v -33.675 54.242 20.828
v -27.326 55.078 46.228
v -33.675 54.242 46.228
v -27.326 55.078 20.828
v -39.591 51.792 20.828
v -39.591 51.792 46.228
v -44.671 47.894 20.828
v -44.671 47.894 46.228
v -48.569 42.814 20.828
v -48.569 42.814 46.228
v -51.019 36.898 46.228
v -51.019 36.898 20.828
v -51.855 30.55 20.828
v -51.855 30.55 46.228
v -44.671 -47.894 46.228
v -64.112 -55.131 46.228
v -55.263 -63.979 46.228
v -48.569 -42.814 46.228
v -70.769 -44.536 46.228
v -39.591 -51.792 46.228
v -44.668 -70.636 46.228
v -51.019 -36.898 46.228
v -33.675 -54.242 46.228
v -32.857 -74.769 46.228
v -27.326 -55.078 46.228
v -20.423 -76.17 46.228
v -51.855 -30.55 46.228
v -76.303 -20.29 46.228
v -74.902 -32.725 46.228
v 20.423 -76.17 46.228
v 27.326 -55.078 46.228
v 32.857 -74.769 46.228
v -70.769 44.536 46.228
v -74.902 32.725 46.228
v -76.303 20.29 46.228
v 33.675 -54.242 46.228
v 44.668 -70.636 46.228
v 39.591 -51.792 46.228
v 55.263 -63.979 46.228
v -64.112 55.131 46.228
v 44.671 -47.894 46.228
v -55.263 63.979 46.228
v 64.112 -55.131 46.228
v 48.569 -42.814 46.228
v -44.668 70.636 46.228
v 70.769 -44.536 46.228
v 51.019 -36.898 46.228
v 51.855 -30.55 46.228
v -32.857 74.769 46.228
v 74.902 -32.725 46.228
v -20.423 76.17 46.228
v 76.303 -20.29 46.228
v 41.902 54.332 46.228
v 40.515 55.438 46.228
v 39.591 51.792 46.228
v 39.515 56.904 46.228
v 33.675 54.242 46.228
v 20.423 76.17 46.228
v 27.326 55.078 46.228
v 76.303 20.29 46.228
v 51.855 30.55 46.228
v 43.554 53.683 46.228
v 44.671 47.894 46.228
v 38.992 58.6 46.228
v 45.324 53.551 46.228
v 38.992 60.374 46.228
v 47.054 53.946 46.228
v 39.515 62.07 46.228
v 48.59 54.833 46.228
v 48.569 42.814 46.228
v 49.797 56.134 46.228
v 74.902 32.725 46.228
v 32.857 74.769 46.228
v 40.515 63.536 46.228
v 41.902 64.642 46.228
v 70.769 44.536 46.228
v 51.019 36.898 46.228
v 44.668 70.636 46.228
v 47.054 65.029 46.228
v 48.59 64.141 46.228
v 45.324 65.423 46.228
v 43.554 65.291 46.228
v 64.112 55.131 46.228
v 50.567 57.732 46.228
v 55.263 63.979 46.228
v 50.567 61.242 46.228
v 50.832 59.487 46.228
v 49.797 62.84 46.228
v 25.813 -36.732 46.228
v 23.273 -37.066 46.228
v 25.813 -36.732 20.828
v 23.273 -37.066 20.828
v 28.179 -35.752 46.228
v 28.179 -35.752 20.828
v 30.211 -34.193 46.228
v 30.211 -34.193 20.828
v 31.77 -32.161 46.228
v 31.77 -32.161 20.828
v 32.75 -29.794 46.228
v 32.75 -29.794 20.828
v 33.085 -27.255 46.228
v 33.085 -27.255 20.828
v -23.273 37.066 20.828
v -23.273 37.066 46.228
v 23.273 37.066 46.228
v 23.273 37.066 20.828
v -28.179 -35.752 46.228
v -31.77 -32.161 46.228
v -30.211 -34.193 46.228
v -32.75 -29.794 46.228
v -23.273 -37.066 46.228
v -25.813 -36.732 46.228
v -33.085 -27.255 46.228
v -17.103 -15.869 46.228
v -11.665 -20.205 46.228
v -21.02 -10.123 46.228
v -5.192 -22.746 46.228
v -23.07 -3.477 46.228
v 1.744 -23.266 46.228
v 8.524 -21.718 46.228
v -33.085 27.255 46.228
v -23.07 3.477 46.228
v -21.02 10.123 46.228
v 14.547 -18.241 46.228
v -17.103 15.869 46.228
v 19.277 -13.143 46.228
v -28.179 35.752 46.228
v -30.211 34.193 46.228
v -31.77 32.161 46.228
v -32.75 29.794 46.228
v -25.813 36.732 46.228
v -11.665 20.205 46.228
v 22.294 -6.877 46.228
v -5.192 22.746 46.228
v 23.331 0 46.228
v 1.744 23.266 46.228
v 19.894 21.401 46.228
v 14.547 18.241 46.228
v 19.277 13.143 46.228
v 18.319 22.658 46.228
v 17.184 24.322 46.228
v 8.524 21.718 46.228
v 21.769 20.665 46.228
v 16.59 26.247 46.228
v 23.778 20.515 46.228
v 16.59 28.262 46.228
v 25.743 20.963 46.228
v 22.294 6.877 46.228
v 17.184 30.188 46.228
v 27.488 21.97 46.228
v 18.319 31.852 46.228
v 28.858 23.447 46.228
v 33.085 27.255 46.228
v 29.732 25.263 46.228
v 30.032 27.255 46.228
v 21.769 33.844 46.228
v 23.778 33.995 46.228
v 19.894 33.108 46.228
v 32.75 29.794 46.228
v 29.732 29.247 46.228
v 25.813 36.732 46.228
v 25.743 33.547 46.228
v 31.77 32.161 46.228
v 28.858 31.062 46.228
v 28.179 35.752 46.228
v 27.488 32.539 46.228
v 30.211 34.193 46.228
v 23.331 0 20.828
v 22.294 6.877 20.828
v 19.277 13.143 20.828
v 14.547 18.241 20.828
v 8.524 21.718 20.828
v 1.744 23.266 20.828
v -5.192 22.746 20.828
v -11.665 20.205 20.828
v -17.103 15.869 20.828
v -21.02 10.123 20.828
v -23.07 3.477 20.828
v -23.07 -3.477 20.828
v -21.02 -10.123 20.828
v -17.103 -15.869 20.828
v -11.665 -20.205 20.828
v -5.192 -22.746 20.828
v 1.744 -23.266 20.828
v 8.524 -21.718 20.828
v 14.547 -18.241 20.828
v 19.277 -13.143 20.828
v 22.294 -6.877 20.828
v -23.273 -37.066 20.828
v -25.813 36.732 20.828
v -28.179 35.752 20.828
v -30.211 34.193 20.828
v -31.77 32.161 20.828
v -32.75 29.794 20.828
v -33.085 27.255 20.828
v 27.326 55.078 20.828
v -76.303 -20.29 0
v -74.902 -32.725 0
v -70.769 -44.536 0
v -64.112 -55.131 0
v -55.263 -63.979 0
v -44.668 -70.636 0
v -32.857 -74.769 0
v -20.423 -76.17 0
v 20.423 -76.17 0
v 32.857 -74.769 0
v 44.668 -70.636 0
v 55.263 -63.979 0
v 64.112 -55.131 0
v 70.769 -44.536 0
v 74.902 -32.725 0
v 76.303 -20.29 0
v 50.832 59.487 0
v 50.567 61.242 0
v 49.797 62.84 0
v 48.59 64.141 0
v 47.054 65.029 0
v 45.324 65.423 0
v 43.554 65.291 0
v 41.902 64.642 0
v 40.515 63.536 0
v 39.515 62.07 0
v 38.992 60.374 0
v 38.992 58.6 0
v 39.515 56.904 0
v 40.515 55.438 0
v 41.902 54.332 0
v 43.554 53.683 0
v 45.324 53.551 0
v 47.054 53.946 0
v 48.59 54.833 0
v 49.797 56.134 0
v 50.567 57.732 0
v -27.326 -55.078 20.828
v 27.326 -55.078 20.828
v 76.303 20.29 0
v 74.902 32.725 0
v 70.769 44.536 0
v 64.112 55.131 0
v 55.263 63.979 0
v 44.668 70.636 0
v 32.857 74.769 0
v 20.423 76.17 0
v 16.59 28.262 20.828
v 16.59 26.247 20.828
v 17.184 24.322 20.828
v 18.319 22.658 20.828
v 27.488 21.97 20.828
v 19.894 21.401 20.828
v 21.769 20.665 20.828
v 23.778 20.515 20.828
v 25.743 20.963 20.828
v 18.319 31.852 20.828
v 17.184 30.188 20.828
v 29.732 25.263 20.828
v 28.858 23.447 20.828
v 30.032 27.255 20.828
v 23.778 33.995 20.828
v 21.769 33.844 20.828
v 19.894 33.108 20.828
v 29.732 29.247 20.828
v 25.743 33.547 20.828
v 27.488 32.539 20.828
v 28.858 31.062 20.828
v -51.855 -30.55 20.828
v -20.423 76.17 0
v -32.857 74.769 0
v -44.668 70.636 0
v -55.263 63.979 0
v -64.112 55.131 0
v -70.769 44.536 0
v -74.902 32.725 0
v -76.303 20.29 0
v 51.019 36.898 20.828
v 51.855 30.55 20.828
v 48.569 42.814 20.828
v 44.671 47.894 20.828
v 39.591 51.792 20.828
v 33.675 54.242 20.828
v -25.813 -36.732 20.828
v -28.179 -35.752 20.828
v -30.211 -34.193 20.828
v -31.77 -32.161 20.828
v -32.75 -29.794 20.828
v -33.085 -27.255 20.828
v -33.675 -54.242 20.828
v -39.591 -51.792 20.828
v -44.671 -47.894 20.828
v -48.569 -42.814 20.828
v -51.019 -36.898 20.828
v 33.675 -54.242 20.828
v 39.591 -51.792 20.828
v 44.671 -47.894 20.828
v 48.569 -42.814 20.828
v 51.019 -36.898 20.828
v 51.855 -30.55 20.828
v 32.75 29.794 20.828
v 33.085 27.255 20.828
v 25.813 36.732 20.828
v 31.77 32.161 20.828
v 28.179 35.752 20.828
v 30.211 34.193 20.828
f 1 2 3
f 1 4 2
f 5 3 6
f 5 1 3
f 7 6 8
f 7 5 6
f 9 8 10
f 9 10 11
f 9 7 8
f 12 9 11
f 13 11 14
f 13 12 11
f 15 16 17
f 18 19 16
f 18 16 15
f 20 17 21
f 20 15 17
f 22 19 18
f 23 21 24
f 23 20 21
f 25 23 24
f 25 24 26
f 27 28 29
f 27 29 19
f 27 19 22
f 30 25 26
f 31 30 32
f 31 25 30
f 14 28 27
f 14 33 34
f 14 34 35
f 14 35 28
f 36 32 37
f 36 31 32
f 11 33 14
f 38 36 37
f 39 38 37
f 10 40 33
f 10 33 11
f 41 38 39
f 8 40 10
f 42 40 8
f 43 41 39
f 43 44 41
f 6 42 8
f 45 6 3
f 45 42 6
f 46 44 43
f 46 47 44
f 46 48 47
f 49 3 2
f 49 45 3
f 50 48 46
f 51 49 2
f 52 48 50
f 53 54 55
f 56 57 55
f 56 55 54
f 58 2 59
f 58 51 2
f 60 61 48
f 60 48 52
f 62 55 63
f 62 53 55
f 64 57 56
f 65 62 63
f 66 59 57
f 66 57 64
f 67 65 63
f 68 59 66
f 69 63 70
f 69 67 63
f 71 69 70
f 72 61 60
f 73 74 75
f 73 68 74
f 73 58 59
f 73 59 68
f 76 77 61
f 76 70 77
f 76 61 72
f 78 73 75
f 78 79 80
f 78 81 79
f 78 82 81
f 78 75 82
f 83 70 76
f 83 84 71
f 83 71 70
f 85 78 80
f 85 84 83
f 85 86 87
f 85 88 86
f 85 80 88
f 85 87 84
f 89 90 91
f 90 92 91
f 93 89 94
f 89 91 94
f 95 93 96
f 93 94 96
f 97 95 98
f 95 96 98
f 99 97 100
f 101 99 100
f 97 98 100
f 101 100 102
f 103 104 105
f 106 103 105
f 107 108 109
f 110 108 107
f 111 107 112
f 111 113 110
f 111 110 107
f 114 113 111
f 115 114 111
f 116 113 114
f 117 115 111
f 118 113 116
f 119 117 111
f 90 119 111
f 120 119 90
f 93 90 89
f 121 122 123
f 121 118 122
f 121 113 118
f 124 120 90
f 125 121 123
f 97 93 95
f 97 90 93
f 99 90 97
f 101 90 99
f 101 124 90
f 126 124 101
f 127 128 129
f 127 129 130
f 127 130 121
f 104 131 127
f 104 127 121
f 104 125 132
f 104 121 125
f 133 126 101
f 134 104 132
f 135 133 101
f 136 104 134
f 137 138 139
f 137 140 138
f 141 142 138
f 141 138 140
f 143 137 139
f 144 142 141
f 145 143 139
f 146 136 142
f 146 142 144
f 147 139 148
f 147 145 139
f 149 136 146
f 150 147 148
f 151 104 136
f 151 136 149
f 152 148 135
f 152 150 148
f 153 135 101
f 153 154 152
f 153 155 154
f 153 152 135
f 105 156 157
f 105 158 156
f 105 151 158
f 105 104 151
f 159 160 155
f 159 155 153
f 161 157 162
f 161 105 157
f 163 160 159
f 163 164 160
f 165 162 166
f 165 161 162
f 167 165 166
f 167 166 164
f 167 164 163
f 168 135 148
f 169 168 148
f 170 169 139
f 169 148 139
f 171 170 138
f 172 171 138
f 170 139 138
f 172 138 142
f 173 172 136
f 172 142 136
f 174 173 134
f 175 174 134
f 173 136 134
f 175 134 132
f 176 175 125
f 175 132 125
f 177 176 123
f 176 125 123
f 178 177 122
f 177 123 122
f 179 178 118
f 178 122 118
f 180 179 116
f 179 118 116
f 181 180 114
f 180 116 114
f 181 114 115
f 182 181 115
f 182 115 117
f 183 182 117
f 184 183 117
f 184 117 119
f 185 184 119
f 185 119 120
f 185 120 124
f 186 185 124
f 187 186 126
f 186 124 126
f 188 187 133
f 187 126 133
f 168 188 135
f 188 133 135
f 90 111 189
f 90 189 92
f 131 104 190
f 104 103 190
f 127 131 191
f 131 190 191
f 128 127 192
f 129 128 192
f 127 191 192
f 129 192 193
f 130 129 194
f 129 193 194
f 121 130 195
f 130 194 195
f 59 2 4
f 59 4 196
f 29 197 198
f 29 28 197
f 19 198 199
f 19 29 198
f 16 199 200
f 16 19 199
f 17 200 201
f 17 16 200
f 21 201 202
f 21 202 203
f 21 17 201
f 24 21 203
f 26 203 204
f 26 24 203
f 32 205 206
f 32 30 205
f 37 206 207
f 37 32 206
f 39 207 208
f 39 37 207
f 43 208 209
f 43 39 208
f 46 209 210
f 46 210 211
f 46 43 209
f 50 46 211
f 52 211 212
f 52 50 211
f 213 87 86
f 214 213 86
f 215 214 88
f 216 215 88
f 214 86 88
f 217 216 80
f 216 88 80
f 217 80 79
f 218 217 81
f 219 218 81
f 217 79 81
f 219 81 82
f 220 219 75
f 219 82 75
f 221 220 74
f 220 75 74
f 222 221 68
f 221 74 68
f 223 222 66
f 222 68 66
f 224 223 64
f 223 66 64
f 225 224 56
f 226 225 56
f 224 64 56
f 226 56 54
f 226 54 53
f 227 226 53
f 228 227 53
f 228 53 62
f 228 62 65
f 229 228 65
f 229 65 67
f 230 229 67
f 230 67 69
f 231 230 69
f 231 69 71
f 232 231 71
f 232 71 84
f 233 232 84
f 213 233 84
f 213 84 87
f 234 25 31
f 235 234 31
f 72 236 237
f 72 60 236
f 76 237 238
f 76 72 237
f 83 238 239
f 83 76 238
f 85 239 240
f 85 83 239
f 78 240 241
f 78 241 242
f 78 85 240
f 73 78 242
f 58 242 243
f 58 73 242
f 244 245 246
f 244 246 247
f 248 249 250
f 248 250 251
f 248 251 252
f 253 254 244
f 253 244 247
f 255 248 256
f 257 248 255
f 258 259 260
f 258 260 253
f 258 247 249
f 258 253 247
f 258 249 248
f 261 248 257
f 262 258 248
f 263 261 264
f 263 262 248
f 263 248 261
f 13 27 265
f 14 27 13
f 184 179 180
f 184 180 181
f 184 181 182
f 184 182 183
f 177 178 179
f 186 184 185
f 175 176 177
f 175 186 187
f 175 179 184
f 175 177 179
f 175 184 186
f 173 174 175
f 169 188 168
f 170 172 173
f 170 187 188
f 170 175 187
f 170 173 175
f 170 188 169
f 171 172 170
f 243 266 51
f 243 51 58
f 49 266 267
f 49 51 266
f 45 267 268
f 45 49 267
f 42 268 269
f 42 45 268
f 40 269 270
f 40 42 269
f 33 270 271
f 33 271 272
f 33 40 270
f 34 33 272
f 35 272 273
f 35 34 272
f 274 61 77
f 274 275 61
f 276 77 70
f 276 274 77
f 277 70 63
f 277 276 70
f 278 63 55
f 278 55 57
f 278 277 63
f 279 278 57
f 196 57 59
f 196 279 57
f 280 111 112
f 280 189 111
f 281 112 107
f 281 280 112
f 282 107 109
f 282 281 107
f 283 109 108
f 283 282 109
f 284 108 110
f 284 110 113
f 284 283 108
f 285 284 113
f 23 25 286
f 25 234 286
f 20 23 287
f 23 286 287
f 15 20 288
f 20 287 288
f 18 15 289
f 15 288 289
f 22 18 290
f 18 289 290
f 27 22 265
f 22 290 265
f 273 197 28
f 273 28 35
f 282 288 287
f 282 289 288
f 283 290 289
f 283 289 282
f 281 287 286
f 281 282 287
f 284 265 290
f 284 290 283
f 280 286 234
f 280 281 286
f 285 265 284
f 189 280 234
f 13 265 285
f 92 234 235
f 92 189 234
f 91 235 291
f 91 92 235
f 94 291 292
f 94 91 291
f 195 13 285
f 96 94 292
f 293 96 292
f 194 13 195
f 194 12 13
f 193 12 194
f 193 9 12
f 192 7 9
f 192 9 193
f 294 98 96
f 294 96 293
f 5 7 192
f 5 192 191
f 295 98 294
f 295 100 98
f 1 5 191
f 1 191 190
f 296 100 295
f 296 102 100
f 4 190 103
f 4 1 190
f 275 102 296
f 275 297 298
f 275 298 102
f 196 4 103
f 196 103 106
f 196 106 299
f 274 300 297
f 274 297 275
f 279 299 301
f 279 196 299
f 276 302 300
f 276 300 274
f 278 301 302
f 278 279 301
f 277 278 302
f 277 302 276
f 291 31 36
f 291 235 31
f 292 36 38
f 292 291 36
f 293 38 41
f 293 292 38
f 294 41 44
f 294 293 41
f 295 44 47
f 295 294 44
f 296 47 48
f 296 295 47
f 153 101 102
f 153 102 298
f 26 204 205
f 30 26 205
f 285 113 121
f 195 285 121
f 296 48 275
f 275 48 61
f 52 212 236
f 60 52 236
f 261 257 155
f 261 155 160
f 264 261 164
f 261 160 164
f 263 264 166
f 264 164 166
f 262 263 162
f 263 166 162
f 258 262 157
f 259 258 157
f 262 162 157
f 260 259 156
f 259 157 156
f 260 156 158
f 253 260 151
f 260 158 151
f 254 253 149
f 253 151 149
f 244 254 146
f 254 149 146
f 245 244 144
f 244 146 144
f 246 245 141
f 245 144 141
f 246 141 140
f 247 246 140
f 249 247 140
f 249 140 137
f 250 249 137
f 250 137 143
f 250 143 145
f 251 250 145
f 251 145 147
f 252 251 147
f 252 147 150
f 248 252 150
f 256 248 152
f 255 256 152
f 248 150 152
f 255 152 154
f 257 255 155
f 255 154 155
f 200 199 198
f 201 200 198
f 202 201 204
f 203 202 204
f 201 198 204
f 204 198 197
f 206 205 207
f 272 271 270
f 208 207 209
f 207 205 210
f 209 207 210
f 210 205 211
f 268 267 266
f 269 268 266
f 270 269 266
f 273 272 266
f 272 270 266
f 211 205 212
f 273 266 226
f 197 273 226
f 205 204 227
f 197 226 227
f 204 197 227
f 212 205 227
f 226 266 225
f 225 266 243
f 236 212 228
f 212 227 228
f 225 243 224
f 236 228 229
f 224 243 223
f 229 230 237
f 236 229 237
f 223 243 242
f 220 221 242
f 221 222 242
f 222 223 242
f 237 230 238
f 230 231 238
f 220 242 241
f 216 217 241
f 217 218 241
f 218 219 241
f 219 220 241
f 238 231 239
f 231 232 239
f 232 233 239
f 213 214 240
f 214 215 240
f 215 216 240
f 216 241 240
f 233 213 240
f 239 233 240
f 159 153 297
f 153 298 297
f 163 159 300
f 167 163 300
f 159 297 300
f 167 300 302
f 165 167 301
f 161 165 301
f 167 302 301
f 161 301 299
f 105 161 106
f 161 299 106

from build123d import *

# Parameters (mm, degrees)
F0_W      = 152.605712
F0_H      = 152.340234
F1_DEPTH  = 46.228
F2_R      = 55.88
F3_R      = 55.88
F4_R      = 55.88
F5_R      = 55.88
F6_W      = 103.709646
F6_H      = 110.155954
F6_W_2    = 66.169404
F6_H_2    = 74.132488
F7_DEPTH  = 25.4
F8_R      = 24.52841
F9_R      = 9.811364
F10_R     = 23.330853
F11_DEPTH = 25.4
F12_R     = 6.759077
F13_DEPTH = 25.4
F14_R     = 5.952934
F15_DEPTH = 62.484


with BuildPart() as f1:
    # F0 (on Top) → F1 (new body)
    with BuildSketch(Plane.XY):
        Rectangle(F0_W, F0_H)
    extrude(amount=F1_DEPTH)

    # F2
    f2_edges = [f1.edges().sort_by_distance(p)[0] for p in [
        (76.302856, 76.170117, 23.114),
    ]]
    fillet(f2_edges, radius=F2_R)

    # F3
    f3_edges = [f1.edges().sort_by_distance(p)[0] for p in [
        (-76.302856, 76.170117, 23.114),
    ]]
    fillet(f3_edges, radius=F3_R)

    # F4
    f4_edges = [f1.edges().sort_by_distance(p)[0] for p in [
        (-76.302856, -76.170117, 23.114),
    ]]
    fillet(f4_edges, radius=F4_R)

    # F5
    f5_edges = [f1.edges().sort_by_distance(p)[0] for p in [
        (76.302856, -76.170117, 23.114),
    ]]
    fillet(f5_edges, radius=F5_R)

    # F6 (on face) → F7 (cut)
    with BuildSketch(Plane.XY.offset(46.228)):
        Rectangle(F6_W, F6_H)
        Rectangle(F6_W_2, F6_H_2, mode=Mode.SUBTRACT)
    extrude(amount=-F7_DEPTH, mode=Mode.SUBTRACT)

    # F8
    f8_edges = [f1.edges().sort_by_distance(p)[0] for p in [
        (-51.854823, -55.077977, 33.528),
        (51.854823, -55.077977, 33.528),
        (51.854823, 55.077977, 33.528),
        (-51.854823, 55.077977, 33.528),
    ]]
    fillet(f8_edges, radius=F8_R)

    # F9
    f9_edges = [f1.edges().sort_by_distance(p)[0] for p in [
        (-33.084702, -37.066244, 33.528),
        (-33.084702, 37.066244, 33.528),
        (33.084702, 37.066244, 33.528),
        (33.084702, -37.066244, 33.528),
    ]]
    fillet(f9_edges, radius=F9_R)

    # F10 (on face) → F11 (cut)
    with BuildSketch(Plane.XY.offset(46.228)):
        Circle(F10_R)
    extrude(amount=-F11_DEPTH, mode=Mode.SUBTRACT)

    # F12 (on face) → F13 (cut)
    with BuildSketch(Plane.XY.offset(46.228)):
        with Locations((23.273338, 27.25488)):
            Circle(F12_R)
    extrude(amount=-F13_DEPTH, mode=Mode.SUBTRACT)

    # F14 (on face) → F15 (cut)
    with BuildSketch(Plane.XY.offset(46.228)):
        with Locations((44.878781, 59.487075)):
            Circle(F14_R)
    extrude(amount=-F15_DEPTH, mode=Mode.SUBTRACT)


solid = f1.part
